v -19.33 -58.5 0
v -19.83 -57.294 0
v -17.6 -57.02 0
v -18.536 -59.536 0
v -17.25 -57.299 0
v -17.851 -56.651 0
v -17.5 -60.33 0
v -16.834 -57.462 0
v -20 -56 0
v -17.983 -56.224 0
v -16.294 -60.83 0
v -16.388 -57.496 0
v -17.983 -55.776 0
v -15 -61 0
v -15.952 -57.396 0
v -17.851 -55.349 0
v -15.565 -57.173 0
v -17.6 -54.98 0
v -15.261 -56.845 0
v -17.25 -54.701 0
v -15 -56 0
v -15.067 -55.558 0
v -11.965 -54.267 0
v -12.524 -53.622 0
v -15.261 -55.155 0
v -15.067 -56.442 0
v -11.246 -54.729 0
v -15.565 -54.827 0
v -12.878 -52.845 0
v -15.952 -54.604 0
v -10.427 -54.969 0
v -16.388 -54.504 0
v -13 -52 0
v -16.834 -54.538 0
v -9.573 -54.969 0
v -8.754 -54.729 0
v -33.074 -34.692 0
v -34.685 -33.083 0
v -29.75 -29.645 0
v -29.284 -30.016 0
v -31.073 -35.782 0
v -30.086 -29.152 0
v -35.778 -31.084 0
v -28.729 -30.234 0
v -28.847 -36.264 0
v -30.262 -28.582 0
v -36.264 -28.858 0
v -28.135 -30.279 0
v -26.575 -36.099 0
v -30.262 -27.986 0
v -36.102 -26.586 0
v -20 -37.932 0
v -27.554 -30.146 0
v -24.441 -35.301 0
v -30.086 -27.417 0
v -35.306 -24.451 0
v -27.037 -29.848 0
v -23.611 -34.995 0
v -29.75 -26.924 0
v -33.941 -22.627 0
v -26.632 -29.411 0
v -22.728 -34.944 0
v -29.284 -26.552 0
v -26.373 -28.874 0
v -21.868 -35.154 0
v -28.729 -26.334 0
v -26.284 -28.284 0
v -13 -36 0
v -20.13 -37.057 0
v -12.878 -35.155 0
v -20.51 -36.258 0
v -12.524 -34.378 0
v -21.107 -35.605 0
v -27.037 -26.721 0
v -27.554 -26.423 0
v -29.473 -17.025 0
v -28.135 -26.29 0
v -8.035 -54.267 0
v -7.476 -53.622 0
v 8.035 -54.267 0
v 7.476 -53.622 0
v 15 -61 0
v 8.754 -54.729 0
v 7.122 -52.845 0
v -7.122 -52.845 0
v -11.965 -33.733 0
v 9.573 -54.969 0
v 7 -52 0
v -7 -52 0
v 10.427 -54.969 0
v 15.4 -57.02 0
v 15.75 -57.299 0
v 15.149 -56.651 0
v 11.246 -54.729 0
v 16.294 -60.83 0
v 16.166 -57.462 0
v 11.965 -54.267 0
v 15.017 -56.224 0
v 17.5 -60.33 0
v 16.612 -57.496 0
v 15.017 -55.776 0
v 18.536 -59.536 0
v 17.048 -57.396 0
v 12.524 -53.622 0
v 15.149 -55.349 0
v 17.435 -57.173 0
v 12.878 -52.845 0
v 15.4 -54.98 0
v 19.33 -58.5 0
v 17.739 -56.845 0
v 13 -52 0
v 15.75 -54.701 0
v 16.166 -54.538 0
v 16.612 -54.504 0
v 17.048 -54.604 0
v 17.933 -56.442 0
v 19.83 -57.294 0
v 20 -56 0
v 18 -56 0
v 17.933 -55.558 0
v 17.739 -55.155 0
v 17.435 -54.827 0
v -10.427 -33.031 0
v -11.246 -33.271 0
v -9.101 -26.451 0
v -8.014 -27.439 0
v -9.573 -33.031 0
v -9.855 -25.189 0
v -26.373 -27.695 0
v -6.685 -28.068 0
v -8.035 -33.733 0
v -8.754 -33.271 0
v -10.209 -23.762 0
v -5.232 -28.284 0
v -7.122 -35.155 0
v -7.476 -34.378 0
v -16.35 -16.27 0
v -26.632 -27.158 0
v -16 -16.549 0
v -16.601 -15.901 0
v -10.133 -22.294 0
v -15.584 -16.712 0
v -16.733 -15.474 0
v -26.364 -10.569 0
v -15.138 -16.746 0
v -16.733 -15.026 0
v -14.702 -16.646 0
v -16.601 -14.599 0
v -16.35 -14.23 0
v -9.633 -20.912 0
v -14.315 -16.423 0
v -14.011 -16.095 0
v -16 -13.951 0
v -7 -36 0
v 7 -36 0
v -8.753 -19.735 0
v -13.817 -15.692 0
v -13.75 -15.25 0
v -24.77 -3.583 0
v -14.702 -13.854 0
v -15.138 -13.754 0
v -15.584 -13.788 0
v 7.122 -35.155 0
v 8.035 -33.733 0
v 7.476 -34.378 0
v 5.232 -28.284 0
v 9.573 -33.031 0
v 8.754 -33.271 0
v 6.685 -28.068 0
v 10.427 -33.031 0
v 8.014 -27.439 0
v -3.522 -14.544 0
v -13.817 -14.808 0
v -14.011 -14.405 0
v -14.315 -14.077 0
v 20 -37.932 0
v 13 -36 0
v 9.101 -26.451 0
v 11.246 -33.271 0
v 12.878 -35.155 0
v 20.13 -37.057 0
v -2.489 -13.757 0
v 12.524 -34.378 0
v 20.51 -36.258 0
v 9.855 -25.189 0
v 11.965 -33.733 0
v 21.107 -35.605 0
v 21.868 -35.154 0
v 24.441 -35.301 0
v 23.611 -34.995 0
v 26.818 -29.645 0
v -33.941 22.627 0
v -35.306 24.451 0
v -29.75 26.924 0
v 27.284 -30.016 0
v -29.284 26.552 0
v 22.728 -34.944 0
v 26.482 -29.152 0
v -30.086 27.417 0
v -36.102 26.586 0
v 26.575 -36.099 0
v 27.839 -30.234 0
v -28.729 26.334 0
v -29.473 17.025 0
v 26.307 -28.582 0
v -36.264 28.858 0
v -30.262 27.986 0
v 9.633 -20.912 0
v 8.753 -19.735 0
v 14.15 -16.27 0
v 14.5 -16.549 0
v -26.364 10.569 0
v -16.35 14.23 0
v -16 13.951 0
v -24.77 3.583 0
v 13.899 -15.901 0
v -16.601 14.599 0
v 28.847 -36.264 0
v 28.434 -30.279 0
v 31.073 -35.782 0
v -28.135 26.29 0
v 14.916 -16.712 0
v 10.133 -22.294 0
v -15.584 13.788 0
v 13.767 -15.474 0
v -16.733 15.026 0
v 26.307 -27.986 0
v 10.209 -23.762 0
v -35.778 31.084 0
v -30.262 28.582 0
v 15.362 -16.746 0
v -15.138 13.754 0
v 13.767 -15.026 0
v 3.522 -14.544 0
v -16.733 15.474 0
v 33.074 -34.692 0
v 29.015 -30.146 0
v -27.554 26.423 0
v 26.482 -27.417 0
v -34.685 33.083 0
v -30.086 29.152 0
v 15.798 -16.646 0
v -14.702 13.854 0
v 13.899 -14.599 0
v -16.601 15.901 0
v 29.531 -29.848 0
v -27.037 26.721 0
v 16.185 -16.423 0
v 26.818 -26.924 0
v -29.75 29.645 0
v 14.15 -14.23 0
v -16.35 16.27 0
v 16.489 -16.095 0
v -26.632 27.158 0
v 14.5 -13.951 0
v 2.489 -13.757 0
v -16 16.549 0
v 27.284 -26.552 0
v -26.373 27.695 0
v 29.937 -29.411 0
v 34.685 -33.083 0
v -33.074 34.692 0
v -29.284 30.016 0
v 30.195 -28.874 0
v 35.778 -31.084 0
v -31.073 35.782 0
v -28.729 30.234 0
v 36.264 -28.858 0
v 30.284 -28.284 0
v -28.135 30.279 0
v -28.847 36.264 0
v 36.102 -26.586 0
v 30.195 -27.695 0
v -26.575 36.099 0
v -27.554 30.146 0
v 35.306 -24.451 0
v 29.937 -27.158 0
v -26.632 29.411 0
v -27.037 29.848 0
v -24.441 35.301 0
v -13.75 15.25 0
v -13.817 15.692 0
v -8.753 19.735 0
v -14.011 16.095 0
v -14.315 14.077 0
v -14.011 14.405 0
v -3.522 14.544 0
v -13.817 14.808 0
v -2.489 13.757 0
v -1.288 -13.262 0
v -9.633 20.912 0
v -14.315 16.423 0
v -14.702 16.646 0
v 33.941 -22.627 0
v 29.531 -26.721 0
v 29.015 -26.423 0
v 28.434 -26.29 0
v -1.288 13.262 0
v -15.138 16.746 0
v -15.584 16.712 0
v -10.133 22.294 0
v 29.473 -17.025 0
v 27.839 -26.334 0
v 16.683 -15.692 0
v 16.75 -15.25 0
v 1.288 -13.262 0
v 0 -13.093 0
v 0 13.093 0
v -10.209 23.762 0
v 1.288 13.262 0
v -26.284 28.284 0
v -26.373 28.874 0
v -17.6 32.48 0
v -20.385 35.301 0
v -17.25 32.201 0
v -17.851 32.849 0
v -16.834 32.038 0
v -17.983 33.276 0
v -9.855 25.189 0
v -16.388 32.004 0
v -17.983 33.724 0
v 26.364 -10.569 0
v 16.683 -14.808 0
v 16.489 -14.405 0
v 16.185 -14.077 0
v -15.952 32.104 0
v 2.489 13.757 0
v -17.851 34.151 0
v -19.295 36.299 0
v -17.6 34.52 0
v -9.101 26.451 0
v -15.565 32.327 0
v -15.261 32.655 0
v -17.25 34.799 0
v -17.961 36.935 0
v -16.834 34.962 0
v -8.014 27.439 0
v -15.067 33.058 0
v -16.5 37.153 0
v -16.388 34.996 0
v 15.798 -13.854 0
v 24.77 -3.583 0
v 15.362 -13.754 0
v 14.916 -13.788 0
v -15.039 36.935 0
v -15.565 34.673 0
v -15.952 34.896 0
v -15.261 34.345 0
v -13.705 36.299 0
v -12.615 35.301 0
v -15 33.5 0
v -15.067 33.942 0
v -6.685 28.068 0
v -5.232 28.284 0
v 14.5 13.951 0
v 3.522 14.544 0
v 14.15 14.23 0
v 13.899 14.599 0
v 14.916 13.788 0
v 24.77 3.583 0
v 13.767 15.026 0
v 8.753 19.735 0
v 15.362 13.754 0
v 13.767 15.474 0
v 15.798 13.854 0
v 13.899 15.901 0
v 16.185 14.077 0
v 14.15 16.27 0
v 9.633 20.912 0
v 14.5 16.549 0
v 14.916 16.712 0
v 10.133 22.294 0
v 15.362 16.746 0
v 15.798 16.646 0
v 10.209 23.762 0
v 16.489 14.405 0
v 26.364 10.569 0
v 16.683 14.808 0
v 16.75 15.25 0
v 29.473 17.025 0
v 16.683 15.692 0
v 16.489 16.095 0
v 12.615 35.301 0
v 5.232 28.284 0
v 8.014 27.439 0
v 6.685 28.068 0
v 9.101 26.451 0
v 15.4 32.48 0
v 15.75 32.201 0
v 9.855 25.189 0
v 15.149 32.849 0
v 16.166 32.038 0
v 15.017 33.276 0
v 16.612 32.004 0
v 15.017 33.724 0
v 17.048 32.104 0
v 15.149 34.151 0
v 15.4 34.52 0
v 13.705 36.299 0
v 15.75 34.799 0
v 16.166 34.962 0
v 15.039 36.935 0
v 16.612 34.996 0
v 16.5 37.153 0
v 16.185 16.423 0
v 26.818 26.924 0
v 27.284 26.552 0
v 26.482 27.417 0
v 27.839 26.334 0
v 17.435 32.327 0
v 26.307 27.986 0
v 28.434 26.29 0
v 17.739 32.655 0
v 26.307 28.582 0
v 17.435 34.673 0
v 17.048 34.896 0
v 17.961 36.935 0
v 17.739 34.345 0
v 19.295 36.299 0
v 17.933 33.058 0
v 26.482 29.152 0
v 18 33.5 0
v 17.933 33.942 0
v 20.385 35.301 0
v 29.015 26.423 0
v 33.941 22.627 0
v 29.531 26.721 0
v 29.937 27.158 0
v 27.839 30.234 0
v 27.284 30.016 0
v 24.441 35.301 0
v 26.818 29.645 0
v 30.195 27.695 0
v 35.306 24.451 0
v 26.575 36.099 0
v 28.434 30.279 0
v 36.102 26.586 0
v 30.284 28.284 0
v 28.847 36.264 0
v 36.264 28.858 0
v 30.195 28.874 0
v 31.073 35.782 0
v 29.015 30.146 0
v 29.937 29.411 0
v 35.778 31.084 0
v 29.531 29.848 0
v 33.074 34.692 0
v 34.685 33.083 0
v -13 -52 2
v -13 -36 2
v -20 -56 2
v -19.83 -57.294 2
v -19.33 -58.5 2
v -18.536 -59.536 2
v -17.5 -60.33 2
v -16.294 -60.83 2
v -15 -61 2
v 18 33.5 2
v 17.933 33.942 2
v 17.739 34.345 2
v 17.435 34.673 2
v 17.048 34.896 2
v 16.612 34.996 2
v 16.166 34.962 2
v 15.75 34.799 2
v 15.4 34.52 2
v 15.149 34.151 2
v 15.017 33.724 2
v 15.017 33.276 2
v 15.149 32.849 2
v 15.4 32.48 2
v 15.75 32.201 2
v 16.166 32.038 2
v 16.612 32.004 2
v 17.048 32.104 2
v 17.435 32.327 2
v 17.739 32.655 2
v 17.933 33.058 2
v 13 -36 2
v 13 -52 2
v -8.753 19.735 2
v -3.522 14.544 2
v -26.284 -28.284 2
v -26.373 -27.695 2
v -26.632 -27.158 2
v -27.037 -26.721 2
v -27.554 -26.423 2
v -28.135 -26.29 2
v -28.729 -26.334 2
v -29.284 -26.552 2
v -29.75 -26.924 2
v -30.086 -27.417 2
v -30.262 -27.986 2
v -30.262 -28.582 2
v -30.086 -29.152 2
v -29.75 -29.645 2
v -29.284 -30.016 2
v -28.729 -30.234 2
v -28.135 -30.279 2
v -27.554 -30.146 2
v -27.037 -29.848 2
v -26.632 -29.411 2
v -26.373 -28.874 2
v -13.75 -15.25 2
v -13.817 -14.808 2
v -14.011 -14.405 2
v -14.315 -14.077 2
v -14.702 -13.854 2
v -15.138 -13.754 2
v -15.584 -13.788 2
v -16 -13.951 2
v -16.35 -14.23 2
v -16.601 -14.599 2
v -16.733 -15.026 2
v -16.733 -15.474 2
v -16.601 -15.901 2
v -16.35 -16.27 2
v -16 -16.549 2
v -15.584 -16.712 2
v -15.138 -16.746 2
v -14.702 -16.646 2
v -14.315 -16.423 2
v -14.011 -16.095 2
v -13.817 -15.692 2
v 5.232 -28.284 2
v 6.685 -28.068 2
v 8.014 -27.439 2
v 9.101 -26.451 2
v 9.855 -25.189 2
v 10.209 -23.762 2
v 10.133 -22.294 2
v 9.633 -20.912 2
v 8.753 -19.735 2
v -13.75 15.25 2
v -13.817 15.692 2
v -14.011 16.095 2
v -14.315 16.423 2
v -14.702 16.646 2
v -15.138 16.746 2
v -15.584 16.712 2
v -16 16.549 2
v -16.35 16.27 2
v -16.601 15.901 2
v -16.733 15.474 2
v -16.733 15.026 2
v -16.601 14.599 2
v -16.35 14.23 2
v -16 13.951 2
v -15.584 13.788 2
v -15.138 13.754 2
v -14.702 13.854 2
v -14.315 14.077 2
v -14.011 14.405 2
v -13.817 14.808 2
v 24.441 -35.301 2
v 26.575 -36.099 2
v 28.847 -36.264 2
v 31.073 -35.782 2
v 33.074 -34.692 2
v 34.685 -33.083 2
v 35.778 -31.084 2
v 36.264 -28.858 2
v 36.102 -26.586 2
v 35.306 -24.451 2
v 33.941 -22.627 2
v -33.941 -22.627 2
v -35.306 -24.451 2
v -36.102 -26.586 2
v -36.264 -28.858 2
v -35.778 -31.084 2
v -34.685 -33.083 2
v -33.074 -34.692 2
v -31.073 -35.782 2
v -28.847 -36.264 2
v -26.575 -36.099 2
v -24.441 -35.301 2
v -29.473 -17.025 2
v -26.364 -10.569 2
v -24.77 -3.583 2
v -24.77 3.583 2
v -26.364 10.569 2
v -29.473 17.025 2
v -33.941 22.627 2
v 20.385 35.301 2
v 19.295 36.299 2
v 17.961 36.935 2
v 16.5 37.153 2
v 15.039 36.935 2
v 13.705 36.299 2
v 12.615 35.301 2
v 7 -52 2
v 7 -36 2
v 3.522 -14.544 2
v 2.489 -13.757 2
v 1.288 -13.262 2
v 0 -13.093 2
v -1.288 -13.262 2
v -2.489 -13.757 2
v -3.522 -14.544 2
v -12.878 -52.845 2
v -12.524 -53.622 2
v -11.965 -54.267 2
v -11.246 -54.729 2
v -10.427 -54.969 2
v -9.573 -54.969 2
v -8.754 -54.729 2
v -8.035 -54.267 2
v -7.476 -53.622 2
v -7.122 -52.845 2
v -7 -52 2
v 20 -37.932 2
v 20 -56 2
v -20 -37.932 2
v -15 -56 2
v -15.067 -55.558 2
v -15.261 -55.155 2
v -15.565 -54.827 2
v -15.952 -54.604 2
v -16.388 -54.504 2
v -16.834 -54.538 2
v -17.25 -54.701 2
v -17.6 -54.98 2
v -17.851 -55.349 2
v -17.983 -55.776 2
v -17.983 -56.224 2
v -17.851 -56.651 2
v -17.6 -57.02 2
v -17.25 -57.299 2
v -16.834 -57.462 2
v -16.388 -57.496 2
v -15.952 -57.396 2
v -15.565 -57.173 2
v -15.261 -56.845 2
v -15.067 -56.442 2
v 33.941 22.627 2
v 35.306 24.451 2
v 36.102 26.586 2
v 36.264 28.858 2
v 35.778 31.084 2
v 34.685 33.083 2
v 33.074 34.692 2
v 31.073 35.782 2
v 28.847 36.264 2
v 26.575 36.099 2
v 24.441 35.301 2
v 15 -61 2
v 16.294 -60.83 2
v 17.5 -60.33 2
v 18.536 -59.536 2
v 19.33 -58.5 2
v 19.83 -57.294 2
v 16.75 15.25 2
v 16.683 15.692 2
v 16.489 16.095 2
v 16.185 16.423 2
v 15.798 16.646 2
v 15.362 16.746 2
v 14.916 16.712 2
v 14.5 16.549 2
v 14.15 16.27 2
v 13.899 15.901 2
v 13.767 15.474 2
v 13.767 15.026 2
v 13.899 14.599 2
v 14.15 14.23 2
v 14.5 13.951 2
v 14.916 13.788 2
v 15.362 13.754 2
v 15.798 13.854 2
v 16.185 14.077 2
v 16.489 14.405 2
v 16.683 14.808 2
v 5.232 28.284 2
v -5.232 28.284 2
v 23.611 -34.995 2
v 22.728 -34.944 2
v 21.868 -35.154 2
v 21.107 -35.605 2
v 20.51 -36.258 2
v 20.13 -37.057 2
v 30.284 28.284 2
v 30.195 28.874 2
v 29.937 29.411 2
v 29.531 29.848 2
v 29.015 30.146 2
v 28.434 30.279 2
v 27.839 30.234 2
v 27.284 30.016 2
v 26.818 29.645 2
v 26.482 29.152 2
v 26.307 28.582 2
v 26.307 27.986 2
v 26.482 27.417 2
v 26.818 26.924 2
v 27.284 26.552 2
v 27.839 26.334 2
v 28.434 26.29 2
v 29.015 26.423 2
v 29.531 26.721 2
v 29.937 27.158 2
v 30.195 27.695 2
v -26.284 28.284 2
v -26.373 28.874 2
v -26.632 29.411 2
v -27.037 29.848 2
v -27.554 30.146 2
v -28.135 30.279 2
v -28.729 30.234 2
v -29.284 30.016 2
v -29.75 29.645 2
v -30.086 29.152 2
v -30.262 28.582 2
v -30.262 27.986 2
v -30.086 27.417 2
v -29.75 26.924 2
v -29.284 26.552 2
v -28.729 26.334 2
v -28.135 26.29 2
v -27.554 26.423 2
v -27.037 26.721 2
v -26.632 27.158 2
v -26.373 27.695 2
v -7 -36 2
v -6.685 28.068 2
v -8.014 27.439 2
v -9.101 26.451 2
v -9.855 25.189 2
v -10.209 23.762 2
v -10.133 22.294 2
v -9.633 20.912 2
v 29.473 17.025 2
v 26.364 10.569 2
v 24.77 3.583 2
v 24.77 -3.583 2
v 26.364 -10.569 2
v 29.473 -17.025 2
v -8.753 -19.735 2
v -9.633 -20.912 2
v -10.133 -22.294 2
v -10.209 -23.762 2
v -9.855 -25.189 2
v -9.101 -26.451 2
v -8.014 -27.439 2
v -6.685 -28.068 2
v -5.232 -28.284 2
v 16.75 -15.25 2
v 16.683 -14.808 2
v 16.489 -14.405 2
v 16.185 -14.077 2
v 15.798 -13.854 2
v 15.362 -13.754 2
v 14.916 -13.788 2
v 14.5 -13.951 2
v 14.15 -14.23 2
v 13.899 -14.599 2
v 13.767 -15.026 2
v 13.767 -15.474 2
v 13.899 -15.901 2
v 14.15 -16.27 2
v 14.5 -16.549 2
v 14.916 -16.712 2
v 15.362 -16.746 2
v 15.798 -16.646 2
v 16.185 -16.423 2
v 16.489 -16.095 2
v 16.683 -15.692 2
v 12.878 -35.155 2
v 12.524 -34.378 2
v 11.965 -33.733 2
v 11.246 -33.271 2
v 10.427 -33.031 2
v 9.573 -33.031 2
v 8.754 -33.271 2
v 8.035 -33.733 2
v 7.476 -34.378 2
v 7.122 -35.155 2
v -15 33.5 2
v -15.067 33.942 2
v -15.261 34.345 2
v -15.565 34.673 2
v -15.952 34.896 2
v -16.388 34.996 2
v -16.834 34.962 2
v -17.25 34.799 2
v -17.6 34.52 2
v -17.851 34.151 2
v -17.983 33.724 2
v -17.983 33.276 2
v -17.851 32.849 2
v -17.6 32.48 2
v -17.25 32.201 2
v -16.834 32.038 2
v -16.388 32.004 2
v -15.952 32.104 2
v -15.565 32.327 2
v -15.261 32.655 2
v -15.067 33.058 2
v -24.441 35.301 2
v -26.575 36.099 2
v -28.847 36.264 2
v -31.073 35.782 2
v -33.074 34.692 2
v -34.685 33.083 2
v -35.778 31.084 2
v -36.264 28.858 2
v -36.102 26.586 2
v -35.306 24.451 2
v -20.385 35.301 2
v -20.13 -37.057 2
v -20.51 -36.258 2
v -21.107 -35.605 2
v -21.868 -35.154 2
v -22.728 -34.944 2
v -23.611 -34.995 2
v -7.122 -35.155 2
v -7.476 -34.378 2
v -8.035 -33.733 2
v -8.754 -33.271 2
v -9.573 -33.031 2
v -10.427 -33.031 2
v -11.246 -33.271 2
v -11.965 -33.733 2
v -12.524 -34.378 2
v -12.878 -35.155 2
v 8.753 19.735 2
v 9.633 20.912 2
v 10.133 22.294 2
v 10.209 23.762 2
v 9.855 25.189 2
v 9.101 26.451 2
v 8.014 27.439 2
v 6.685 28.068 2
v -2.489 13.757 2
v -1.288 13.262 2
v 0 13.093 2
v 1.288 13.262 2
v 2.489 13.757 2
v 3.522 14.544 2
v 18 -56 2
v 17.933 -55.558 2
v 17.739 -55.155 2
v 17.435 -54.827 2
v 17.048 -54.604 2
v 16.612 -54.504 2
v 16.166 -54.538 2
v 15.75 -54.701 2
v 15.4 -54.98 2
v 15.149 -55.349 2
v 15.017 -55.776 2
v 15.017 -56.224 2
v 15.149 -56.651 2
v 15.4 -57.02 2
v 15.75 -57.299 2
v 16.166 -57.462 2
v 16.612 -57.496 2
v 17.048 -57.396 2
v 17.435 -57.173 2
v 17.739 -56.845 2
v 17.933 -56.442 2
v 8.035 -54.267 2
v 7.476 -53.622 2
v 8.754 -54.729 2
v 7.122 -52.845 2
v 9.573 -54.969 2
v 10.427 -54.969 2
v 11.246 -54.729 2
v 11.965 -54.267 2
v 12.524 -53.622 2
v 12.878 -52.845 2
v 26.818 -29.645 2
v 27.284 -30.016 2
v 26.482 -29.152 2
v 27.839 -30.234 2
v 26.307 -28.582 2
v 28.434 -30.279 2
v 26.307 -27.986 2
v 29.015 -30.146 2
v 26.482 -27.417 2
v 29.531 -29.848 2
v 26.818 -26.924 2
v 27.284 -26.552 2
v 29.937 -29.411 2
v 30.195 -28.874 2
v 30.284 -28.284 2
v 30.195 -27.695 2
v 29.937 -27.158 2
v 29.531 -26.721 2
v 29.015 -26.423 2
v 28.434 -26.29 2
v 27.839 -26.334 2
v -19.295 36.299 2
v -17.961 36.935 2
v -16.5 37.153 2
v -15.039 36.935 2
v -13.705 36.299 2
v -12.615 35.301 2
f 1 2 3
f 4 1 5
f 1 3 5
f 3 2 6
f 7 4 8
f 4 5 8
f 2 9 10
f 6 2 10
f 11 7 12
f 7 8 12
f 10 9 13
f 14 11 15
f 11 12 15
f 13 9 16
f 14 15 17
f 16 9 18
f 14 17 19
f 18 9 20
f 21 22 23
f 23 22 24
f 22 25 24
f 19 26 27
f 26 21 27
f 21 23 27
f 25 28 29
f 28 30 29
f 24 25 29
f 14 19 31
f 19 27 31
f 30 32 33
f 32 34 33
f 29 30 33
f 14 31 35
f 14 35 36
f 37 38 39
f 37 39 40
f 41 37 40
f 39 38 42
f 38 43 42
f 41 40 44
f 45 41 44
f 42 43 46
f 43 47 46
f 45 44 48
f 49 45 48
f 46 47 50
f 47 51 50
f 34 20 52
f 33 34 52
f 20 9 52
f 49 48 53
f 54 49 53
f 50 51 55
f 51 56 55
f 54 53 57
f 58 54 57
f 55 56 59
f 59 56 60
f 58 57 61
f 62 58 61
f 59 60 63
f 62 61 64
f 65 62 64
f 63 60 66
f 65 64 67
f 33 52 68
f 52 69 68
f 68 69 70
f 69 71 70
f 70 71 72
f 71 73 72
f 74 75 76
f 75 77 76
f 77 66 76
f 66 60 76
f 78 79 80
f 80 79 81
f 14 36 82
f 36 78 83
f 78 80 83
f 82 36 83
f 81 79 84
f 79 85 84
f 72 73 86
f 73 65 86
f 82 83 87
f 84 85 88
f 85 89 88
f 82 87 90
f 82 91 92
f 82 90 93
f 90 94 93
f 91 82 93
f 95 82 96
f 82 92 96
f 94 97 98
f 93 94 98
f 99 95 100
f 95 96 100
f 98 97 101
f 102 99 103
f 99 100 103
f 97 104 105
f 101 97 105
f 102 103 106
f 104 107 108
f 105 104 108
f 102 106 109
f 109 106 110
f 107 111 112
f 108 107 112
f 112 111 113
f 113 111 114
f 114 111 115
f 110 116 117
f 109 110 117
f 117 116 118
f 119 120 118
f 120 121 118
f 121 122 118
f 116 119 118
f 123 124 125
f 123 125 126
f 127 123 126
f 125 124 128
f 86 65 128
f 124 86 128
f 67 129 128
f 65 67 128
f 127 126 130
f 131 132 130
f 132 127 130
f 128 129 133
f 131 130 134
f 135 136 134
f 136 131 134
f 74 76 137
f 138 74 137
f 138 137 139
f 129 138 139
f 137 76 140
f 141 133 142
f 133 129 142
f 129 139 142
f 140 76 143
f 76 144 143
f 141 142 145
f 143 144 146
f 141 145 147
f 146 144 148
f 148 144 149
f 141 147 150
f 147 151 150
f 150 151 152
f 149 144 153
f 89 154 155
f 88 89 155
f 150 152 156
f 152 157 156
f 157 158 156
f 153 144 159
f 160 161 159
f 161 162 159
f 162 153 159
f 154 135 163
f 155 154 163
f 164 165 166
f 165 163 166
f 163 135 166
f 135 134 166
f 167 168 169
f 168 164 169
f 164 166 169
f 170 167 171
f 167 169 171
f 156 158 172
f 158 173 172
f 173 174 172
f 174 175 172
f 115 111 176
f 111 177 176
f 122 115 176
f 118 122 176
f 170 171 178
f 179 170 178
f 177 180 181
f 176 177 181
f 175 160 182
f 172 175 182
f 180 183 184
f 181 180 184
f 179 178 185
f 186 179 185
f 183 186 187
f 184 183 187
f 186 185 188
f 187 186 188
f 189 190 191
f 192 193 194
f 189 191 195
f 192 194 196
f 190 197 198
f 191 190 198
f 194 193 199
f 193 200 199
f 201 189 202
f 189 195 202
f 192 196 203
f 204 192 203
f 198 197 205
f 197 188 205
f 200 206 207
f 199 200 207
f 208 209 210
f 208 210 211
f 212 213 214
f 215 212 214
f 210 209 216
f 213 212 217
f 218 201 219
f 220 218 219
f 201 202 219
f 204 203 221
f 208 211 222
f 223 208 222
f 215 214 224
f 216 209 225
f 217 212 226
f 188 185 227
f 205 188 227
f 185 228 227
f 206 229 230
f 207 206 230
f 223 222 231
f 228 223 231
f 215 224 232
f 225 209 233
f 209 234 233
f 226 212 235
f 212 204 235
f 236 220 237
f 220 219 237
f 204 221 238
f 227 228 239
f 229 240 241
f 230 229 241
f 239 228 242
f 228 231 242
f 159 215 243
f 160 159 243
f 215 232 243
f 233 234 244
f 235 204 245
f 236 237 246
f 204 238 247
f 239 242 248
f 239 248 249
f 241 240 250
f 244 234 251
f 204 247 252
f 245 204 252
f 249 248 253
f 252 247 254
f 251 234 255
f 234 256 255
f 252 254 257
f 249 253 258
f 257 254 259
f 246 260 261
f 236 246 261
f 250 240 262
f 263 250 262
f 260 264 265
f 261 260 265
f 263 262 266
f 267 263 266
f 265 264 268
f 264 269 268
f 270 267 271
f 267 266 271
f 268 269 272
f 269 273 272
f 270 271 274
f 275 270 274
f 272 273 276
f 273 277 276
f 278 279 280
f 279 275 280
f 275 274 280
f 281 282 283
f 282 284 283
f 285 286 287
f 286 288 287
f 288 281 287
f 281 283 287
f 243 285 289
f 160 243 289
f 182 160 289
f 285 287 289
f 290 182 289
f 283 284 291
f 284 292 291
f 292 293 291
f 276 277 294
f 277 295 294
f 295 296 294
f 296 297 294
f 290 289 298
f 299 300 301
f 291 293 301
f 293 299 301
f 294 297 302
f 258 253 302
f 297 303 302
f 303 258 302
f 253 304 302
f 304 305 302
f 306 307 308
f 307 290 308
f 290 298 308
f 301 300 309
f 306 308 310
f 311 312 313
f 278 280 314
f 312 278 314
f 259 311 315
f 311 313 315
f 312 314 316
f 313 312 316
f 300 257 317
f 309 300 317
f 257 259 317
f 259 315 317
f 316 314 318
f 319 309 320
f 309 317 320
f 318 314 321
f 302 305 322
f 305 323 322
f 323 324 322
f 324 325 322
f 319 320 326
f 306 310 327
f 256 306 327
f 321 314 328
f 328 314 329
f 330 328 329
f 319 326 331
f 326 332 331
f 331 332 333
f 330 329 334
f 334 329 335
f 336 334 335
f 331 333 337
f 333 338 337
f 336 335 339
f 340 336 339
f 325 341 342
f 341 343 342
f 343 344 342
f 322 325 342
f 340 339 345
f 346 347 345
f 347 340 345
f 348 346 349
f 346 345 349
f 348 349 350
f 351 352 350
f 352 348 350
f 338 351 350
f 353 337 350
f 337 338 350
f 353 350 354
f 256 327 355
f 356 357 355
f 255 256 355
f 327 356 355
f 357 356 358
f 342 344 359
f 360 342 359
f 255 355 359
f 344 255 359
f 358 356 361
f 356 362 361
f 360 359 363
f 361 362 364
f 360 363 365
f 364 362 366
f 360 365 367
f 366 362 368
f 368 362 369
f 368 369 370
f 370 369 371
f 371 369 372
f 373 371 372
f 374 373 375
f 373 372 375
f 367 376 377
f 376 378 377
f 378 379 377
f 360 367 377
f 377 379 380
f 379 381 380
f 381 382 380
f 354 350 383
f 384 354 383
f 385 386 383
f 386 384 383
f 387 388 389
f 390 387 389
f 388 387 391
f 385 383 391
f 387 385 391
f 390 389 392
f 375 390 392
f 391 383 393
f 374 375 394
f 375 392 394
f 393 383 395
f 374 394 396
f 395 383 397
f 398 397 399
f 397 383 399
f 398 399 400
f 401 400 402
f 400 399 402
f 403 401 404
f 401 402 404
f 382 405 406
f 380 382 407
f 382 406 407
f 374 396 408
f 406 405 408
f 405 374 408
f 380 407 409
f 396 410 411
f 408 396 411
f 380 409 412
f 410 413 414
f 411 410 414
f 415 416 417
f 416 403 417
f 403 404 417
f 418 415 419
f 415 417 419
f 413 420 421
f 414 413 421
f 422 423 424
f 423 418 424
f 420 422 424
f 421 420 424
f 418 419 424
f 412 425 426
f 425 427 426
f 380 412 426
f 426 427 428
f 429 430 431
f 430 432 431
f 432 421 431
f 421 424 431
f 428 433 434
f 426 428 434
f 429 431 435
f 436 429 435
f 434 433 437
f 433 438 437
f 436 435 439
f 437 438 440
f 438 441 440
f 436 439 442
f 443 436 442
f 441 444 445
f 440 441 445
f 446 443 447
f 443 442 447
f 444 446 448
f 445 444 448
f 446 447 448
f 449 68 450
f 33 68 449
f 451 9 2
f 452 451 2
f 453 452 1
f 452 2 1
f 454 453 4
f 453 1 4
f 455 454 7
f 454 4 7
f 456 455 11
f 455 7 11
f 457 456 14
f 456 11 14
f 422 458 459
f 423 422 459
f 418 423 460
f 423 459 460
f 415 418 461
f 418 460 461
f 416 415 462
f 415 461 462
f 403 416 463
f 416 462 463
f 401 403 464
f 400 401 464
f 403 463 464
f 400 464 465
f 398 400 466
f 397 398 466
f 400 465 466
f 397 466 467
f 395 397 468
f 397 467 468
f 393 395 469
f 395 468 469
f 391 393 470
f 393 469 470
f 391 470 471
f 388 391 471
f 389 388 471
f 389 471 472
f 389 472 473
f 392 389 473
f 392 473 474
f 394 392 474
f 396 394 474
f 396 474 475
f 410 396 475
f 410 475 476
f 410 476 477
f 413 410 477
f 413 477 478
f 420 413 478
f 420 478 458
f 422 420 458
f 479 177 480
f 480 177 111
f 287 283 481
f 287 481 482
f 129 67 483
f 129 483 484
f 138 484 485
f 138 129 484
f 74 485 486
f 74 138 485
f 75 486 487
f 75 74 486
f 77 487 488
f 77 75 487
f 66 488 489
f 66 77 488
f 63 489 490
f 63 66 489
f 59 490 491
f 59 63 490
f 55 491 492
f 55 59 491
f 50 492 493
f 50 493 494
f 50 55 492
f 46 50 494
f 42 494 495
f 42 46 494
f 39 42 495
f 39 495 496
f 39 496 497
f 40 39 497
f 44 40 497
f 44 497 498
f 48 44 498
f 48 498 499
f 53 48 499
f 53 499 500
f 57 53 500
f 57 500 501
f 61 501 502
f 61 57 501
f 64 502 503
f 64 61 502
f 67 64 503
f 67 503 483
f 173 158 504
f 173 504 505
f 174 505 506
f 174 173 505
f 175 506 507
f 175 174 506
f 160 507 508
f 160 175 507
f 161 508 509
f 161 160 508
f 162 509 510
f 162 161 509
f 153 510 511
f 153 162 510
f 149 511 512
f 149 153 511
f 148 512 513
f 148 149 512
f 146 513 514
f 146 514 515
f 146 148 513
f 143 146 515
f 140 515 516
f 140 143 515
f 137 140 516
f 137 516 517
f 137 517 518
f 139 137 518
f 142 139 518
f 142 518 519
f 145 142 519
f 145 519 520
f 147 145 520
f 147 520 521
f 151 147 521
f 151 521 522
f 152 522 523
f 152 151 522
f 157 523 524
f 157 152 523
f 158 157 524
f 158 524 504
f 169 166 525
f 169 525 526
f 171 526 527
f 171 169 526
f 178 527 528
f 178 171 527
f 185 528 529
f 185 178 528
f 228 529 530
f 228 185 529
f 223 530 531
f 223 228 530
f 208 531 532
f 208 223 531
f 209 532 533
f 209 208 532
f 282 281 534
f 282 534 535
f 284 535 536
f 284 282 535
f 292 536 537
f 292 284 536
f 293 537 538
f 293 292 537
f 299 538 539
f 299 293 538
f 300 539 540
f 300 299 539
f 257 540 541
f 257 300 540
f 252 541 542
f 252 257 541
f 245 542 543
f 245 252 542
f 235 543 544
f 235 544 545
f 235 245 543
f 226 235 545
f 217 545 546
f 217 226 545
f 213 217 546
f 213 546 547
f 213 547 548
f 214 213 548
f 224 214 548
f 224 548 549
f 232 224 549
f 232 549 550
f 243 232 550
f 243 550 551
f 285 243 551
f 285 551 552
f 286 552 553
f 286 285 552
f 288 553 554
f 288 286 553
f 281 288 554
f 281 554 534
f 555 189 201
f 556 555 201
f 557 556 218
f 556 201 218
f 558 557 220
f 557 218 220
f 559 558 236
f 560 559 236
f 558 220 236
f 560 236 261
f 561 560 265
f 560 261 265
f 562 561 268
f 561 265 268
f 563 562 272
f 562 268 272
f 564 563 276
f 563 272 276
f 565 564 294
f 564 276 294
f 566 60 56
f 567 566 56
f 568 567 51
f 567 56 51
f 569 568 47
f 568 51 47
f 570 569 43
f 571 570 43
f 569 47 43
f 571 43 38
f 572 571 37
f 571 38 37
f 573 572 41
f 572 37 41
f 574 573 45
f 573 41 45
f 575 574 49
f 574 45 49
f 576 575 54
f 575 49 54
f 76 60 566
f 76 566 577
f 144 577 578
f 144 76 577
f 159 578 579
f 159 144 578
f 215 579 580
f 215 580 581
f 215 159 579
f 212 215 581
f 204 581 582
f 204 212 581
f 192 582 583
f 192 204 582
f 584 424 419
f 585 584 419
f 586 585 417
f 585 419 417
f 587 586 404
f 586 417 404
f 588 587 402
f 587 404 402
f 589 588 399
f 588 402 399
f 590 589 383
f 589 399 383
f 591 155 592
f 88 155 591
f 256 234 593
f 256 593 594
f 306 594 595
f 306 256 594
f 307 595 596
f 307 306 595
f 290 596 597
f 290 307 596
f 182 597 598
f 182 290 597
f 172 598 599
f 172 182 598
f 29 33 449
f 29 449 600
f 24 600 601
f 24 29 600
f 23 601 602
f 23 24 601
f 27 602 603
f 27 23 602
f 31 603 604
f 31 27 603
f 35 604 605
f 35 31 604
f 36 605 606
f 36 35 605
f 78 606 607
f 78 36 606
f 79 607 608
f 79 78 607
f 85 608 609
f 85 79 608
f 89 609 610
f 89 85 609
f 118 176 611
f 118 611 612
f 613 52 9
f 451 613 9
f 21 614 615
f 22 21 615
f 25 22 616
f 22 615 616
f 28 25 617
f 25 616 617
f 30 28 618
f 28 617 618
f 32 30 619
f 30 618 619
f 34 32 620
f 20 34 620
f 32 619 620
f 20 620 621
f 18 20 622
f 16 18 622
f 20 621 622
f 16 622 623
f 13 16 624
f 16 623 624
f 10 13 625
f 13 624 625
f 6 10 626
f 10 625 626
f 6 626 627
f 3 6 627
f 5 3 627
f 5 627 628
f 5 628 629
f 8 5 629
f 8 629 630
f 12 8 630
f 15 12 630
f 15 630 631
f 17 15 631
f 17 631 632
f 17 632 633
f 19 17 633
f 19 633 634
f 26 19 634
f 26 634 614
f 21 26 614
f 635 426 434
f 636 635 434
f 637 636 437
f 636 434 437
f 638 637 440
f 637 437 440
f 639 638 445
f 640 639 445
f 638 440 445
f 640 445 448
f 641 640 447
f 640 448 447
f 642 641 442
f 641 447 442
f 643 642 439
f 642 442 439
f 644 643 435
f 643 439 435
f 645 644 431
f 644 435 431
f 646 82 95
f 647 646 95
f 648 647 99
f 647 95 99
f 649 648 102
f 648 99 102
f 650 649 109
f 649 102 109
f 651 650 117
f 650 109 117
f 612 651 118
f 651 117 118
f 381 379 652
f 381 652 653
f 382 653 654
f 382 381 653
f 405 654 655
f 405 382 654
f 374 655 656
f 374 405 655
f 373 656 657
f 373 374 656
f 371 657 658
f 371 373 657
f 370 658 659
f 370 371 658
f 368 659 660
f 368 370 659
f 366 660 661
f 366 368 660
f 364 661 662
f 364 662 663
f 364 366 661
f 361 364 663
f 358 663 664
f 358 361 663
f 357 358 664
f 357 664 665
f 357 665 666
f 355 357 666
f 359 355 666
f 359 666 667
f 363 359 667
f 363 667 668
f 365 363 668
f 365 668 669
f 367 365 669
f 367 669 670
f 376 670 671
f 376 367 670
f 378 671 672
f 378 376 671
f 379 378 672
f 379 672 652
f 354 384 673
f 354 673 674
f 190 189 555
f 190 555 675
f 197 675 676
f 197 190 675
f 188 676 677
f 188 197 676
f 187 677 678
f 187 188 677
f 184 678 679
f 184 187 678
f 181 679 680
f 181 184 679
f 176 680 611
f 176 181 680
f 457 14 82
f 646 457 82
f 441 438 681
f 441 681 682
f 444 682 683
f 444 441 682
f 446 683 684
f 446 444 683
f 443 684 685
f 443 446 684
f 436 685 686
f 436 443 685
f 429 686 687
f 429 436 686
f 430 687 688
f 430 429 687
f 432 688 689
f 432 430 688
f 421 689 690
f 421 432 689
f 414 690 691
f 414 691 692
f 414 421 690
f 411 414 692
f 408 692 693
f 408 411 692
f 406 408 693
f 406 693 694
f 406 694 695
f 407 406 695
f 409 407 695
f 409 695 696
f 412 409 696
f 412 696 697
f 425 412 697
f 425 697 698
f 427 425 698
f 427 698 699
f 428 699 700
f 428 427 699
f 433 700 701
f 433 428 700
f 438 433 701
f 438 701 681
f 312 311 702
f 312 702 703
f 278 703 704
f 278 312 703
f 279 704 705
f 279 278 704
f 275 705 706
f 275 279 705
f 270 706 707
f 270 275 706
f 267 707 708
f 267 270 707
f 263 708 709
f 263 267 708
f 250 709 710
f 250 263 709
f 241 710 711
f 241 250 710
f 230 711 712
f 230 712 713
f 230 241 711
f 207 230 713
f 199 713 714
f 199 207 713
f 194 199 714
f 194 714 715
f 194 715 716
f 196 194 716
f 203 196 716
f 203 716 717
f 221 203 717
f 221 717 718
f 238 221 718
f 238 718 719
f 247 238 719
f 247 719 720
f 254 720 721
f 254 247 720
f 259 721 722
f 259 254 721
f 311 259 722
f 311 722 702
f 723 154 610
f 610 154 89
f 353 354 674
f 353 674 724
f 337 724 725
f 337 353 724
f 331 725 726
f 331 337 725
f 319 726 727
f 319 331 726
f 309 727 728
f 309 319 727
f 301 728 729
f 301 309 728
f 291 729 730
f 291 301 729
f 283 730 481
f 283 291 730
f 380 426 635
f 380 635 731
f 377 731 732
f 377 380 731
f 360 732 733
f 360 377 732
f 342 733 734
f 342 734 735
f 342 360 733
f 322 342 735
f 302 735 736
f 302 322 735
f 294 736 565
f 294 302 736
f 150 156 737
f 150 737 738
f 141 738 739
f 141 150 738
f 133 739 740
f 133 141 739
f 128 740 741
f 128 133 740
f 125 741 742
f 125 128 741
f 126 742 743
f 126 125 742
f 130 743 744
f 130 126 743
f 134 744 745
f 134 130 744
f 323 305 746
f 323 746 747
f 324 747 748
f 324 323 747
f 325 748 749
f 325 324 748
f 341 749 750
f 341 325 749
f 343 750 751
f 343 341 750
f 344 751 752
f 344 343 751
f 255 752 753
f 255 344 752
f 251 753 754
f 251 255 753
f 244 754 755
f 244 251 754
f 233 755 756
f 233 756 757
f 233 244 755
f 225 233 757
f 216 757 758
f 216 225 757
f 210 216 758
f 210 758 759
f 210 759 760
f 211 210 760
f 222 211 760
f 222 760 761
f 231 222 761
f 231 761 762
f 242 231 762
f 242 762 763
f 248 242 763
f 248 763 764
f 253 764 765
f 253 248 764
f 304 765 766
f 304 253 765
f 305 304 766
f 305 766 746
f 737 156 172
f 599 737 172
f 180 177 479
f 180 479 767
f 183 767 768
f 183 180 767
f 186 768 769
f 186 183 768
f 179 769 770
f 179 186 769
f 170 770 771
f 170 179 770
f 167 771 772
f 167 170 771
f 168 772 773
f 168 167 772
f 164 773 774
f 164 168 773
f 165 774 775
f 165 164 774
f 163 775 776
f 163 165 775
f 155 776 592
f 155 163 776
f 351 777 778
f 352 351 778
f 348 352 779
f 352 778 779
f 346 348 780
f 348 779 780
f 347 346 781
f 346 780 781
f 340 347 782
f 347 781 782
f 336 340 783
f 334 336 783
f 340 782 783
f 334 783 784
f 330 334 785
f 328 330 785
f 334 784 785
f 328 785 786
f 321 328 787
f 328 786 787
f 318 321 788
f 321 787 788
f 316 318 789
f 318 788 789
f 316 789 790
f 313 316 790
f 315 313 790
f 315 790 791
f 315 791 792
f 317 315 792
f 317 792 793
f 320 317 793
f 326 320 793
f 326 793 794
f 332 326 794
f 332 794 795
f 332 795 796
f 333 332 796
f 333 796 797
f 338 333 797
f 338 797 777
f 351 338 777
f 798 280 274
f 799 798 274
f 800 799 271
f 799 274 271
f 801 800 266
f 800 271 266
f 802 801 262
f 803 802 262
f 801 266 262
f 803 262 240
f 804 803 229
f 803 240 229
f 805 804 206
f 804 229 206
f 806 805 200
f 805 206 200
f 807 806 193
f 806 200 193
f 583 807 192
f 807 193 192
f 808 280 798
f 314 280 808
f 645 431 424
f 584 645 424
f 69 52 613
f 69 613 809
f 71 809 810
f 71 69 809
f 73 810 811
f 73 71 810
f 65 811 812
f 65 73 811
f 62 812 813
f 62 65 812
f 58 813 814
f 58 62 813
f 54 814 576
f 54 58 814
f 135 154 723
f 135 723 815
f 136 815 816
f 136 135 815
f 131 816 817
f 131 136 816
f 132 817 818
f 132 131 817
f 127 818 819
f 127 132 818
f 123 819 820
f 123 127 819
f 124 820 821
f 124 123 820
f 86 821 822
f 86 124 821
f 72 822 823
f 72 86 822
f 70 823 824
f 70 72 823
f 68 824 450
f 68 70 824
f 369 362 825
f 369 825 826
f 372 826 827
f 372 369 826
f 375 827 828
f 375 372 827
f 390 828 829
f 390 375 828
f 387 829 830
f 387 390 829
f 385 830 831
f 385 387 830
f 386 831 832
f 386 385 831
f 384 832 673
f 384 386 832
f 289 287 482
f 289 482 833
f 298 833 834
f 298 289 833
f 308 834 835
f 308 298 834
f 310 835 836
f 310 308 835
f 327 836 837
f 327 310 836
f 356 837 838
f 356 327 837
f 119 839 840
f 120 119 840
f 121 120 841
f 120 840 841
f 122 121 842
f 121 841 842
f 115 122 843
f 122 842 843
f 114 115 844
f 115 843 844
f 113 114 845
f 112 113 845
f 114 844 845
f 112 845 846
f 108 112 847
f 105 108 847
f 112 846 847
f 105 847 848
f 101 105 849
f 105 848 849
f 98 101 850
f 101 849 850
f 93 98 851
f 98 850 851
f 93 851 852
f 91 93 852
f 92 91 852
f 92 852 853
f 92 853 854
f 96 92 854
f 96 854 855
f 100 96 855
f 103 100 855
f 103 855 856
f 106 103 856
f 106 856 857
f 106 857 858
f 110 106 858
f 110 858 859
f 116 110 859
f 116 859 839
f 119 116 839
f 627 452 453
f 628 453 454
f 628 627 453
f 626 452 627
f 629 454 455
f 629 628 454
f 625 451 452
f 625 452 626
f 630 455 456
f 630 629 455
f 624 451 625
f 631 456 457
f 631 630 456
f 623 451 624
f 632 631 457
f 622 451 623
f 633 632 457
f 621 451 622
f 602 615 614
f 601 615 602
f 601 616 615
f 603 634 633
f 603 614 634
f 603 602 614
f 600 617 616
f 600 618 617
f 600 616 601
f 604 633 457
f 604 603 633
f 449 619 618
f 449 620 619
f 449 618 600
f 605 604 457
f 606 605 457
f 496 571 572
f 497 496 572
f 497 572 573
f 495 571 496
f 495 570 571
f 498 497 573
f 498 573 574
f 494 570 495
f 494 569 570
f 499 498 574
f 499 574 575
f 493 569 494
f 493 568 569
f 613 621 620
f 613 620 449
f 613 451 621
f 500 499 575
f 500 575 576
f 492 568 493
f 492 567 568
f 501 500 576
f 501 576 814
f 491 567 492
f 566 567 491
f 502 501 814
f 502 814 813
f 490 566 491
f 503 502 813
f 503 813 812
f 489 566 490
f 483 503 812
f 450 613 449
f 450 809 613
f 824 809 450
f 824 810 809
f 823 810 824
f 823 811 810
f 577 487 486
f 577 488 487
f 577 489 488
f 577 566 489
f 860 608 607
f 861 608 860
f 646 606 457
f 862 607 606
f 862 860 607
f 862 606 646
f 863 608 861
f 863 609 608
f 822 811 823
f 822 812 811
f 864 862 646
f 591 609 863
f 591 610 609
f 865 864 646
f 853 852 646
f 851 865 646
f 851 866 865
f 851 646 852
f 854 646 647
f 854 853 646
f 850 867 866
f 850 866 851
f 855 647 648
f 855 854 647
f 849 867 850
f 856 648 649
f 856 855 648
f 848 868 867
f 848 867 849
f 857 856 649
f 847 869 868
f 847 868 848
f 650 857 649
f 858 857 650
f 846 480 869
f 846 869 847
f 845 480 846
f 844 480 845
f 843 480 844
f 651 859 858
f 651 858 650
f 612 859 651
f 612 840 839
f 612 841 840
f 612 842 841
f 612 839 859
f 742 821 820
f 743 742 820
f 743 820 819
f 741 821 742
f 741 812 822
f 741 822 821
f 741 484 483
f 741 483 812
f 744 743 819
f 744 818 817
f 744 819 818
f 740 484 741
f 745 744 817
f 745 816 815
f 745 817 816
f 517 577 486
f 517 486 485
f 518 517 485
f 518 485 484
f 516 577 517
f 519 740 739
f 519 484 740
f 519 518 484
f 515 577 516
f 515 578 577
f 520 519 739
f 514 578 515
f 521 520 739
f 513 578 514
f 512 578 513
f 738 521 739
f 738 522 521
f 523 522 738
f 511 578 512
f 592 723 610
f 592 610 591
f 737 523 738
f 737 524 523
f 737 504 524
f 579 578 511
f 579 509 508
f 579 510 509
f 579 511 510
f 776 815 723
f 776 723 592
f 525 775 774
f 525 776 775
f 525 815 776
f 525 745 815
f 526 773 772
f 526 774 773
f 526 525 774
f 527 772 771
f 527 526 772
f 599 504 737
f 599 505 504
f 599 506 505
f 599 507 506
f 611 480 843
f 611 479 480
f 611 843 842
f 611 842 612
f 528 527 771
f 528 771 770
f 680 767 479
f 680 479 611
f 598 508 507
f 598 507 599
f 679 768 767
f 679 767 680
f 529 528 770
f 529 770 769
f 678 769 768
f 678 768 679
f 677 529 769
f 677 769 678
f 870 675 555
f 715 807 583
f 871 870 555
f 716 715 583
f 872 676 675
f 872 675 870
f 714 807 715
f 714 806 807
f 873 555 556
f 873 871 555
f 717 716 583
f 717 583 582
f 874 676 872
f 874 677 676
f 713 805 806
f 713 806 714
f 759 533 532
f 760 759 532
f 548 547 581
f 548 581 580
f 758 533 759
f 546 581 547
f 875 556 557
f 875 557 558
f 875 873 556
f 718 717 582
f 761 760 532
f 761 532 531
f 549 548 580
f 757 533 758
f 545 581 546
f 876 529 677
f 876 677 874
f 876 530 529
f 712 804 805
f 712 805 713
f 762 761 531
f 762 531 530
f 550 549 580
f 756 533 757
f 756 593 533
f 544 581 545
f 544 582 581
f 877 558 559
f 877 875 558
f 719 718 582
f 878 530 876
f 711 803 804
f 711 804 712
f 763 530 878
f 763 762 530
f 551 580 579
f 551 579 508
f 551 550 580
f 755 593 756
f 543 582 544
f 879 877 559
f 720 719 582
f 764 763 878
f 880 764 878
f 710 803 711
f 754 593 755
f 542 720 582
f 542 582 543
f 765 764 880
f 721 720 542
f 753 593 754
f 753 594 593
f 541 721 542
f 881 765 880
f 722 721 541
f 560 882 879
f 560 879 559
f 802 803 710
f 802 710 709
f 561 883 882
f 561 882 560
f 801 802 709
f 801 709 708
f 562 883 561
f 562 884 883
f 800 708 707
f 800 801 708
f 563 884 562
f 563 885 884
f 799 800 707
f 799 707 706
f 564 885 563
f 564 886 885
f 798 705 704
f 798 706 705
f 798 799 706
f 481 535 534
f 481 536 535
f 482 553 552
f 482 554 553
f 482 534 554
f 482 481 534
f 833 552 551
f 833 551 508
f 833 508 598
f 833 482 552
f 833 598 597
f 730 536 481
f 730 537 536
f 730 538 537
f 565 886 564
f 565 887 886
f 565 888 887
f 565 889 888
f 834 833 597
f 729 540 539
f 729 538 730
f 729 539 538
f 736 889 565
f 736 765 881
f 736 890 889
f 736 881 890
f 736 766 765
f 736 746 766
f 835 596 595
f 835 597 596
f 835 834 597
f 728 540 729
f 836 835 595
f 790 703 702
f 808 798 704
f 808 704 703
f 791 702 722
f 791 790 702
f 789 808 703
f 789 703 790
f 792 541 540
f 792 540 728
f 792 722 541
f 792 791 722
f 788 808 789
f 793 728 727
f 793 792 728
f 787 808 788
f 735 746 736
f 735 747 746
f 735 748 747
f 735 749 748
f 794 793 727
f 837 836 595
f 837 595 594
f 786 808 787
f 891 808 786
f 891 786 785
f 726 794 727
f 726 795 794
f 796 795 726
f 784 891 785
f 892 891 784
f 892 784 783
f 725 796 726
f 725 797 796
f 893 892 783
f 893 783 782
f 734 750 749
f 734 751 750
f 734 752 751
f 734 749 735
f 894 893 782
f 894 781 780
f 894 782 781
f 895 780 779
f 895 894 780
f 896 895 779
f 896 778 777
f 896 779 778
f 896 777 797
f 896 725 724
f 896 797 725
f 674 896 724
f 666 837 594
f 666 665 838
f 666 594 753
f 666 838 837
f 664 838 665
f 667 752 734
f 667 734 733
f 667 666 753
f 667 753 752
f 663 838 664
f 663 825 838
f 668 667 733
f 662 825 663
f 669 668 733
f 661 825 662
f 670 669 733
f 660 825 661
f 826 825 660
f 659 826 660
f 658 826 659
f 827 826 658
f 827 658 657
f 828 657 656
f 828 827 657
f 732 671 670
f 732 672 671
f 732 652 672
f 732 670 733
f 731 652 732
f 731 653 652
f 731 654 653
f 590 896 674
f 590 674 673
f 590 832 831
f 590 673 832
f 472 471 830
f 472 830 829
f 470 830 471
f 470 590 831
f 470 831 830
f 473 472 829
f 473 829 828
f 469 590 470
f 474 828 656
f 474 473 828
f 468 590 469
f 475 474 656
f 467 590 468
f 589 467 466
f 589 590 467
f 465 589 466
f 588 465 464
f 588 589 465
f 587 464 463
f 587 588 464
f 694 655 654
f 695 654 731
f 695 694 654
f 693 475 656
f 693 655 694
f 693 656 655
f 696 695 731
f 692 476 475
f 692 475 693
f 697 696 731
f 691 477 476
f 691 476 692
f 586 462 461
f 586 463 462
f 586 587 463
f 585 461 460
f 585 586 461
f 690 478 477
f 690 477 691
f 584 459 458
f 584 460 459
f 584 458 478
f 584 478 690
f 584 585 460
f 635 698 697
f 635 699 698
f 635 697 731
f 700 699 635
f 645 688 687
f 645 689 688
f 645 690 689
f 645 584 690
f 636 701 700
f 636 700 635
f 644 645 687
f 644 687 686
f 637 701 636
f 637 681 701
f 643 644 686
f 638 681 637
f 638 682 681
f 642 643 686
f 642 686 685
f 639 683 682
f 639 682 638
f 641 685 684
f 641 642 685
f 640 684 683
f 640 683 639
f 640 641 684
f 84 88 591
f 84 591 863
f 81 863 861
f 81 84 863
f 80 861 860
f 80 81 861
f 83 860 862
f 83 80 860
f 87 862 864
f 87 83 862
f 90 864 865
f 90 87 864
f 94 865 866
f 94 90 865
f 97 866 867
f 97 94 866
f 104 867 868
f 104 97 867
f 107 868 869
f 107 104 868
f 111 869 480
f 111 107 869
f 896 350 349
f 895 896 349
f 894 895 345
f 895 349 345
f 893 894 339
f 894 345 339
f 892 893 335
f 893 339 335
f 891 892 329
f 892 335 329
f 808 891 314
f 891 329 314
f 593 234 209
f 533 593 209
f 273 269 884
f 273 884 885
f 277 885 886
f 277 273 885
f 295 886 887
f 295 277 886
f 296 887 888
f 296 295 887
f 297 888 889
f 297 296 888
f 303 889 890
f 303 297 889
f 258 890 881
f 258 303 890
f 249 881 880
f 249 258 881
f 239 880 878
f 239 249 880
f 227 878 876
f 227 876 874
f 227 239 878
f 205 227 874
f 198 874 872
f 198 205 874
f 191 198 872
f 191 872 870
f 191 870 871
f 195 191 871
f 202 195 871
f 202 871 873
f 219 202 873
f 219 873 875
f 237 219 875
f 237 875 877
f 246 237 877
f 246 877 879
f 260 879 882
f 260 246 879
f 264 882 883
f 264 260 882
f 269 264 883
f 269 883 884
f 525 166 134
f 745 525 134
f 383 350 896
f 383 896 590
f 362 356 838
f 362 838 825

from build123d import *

# Parameters (mm, degrees)
SKETCH_R     = 2
SKETCH_R_2   = 1.5
PAD_DEPTH    = 2
SKETCH001_R  = 1.5
POCKET_DEPTH = 2.001


with BuildPart() as part:
    # Sketch → Pad (new body)
    with BuildSketch(Plane.XY):
        with BuildLine():
            Line((-20, -37.931886), (-20, -56))
            ThreePointArc((-20, -56), (-18.535534, -59.535534), (-15, -61))
            Line((-15, -61), (15, -61))
            ThreePointArc((15, -61), (18.535534, -59.535534), (20, -56))
            Line((20, -37.931886), (20, -56))
            ThreePointArc((24.441165, -35.300719), (21.470865, -35.35085), (20, -37.931886))
            ThreePointArc((24.441165, -35.300719), (34.685487, -33.08265), (33.941125, -22.627417))
            ThreePointArc((33.941125, 22.627417), (24.568542, 0), (33.941125, -22.627417))
            ThreePointArc((33.941125, 22.627417), (34.685487, 33.08265), (24.441165, 35.300719))
            Line((24.441165, 35.300719), (20.385, 35.300719))
            ThreePointArc((20.385, 35.300719), (16.5, 37.153216), (12.615, 35.300719))
            Line((-12.615, 35.300719), (12.615, 35.300719))
            ThreePointArc((-12.615, 35.300719), (-16.5, 37.153216), (-20.385, 35.300719))
            Line((-24.441165, 35.300719), (-20.385, 35.300719))
            ThreePointArc((-24.441165, 35.300719), (-34.685487, 33.08265), (-33.941125, 22.627417))
            ThreePointArc((-33.941125, -22.627417), (-24.568542, 0), (-33.941125, 22.627417))
            ThreePointArc((-33.941125, -22.627417), (-34.685487, -33.08265), (-24.441165, -35.300719))
            ThreePointArc((-20, -37.931886), (-21.470865, -35.35085), (-24.441165, -35.300719))
        make_face()
        with Locations((28.284271, 28.284271)):
            Circle(SKETCH_R, mode=Mode.SUBTRACT)
        with Locations((28.284271, -28.284271)):
            Circle(SKETCH_R, mode=Mode.SUBTRACT)
        with Locations((-28.284271, -28.284271)):
            Circle(SKETCH_R, mode=Mode.SUBTRACT)
        with Locations((-28.284271, 28.284271)):
            Circle(SKETCH_R, mode=Mode.SUBTRACT)
        with Locations((15.25, 15.25)):
            Circle(SKETCH_R_2, mode=Mode.SUBTRACT)
        with Locations((-15.25, 15.25)):
            Circle(SKETCH_R_2, mode=Mode.SUBTRACT)
        with Locations((-15.25, -15.25)):
            Circle(SKETCH_R_2, mode=Mode.SUBTRACT)
        with Locations((15.25, -15.25)):
            Circle(SKETCH_R_2, mode=Mode.SUBTRACT)
        with BuildLine():
            ThreePointArc((-7, -36), (-10, -33), (-13, -36))
            Line((-13, -36), (-13, -52))
            ThreePointArc((-13, -52), (-10, -55), (-7, -52))
            Line((-7, -36), (-7, -52))
        make_face(mode=Mode.SUBTRACT)
        with BuildLine():
            ThreePointArc((13, -36), (10, -33), (7, -36))
            Line((7, -36), (7, -52))
            ThreePointArc((7, -52), (10, -55), (13, -52))
            Line((13, -36), (13, -52))
        make_face(mode=Mode.SUBTRACT)
        with BuildLine():
            Line((-8.75337, 19.734959), (-3.521702, 14.543988))
            ThreePointArc((-3.521702, 14.543988), (0, 13.0933), (3.521702, 14.543988))
            Line((3.521702, 14.543988), (8.75337, 19.734959))
            ThreePointArc((8.75337, 19.734959), (9.854793, 25.188666), (5.231669, 28.284271))
            Line((5.231669, 28.284271), (-5.231669, 28.284271))
            ThreePointArc((-5.231669, 28.284271), (-9.854793, 25.188666), (-8.75337, 19.734959))
        make_face(mode=Mode.SUBTRACT)
        with BuildLine():
            Line((3.521702, -14.543988), (8.75337, -19.734959))
            ThreePointArc((5.231669, -28.284271), (9.854793, -25.188666), (8.75337, -19.734959))
            Line((5.231669, -28.284271), (-5.231669, -28.284271))
            ThreePointArc((-8.75337, -19.734959), (-9.854793, -25.188666), (-5.231669, -28.284271))
            Line((-8.75337, -19.734959), (-3.521702, -14.543988))
            ThreePointArc((3.521702, -14.543988), (0, -13.0933), (-3.521702, -14.543988))
        make_face(mode=Mode.SUBTRACT)
    extrude(amount=PAD_DEPTH)

    # Sketch001 → Pocket (cut, through all)
    with BuildSketch(Plane.XY.offset(2)):
        with Locations((-16.5, 33.5)):
            Circle(SKETCH001_R)
        with Locations((16.5, 33.5)):
            Circle(SKETCH001_R)
        with Locations((16.5, -56)):
            Circle(SKETCH001_R)
        with Locations((-16.5, -56)):
            Circle(SKETCH001_R)
    extrude(amount=-POCKET_DEPTH, mode=Mode.SUBTRACT)


solid = part.part
